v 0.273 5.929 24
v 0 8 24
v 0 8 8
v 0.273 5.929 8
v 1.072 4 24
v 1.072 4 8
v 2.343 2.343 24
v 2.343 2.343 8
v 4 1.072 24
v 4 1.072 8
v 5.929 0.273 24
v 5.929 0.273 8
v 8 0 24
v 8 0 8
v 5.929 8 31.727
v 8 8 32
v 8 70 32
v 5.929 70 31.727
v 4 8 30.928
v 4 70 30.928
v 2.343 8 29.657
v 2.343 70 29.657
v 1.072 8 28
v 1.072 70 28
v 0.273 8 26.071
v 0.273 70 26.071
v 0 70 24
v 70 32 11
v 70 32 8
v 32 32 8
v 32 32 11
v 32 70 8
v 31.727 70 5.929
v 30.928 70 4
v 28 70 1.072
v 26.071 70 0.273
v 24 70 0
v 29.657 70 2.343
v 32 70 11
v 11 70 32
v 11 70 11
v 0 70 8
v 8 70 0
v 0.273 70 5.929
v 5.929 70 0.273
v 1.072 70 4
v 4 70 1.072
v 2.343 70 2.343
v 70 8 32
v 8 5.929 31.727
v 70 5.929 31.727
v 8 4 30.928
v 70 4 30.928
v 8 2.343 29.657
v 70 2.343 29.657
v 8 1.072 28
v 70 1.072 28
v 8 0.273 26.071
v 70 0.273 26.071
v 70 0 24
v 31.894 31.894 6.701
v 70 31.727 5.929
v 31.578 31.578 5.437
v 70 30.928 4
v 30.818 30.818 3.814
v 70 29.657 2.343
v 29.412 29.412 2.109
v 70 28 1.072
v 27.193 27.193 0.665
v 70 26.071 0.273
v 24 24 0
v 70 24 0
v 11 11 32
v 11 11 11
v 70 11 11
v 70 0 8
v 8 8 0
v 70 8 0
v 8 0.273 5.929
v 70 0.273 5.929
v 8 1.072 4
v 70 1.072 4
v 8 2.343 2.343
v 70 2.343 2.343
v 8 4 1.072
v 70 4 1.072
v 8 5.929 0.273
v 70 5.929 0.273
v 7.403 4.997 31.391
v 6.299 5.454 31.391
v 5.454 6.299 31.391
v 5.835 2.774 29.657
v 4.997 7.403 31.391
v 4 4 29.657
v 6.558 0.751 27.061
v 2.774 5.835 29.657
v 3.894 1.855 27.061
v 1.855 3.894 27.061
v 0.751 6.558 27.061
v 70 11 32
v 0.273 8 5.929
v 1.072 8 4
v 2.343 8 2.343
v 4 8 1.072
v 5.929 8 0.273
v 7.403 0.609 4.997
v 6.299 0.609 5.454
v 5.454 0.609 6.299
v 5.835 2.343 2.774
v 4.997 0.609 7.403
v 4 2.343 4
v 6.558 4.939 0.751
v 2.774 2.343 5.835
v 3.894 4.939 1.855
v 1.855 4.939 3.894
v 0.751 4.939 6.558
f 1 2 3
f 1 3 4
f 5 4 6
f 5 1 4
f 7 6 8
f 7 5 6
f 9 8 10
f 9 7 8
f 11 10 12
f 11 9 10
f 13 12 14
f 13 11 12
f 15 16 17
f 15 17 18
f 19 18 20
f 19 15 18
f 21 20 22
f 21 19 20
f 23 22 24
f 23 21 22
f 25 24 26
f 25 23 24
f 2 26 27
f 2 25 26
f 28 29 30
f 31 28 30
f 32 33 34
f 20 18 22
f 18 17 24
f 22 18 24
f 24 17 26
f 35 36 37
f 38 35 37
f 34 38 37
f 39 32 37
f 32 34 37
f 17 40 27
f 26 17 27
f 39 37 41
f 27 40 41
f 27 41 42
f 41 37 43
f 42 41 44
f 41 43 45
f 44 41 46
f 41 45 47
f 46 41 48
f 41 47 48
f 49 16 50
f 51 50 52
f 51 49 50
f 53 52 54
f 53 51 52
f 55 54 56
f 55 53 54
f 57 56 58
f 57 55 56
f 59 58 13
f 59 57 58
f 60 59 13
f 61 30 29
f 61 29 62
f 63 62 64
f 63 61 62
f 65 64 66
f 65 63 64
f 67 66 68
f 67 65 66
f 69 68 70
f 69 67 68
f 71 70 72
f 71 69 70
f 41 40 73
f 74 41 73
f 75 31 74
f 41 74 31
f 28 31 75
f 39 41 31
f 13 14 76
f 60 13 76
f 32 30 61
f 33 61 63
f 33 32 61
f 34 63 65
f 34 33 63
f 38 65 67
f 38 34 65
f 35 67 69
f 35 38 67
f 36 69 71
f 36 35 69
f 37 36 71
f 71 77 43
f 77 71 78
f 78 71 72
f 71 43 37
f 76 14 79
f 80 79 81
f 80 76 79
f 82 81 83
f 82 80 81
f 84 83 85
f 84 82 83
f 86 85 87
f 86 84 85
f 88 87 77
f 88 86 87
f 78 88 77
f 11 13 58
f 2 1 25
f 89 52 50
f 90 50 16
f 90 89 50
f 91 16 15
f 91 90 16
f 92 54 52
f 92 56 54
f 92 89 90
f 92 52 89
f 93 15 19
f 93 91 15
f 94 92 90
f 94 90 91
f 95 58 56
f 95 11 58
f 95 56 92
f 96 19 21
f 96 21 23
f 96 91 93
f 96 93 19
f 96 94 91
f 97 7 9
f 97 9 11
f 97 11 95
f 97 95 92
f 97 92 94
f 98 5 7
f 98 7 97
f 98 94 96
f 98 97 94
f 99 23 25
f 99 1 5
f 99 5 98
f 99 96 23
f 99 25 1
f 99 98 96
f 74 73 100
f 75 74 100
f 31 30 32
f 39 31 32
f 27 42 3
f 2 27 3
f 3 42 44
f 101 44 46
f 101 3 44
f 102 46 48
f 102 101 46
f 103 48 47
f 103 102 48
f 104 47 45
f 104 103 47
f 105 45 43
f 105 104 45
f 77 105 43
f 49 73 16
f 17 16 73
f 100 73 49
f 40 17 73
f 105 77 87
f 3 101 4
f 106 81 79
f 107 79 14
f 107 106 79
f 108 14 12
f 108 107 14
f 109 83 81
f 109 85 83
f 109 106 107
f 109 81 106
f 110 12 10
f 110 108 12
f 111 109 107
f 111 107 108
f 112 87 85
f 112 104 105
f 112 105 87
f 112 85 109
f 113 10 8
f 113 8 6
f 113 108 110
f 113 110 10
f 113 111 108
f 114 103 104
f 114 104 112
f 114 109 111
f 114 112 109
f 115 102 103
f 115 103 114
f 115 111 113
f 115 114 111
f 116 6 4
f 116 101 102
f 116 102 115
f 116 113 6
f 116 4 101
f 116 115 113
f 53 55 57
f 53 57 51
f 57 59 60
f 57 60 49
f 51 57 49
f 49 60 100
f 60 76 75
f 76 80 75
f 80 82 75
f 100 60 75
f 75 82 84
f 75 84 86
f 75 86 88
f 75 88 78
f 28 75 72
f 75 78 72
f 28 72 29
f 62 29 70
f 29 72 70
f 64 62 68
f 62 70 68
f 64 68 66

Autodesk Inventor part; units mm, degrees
ref_plane "YZ Plane" through (0, 0, 0) normal (1, 0, 0) x (0, 1, 0)
ref_plane "XZ Plane" through (0, 0, 0) normal (0, 1, 0) x (-1, 0, 0)
ref_plane "XY Plane" through (0, 0, 0) normal (0, 0, 1) x (1, 0, 0)
sketch "スケッチ1" plane through (0, 0, 0) normal (0, 0, 1) x (1, 0, 0)
  line L0 (0, 0) -> (70, 0)
  line L1 (70, 0) -> (70, 32)
  line L2 (70, 32) -> (32, 32)
  line L3 (32, 32) -> (32, 70)
  line L4 (32, 70) -> (0, 70)
  line L5 (0, 70) -> (0, 0)
  dimension "d0" = 70
  dimension "d1" = 70
  dimension "d3" = 32
  dimension "d4" = 32
extrude "押し出し1" add sketch "スケッチ1" along normal blind 32
sketch "スケッチ2" plane through (0, 0, 32) normal (0, 0, 1) x (1, 0, 0)
  line L0 (11, 11) -> (70, 11)
  line L1 (70, 11) -> (70, 70)
  line L2 (70, 70) -> (11, 70)
  line L3 (11, 70) -> (11, 11)
  line L4 (32, 70) -> (0, 70) projected
  line L5 (70, 0) -> (70, 32) projected
  line L6 (32, 32) -> (32, 70) projected
  line L7 (70, 32) -> (32, 32) projected
  point P0 (0, 0)
  dimension "d11" = 21
  dimension "d12" = 21
extrude "押し出し2" cut sketch "スケッチ2" against normal blind 21
fillet "フィレット1" radius 8 7 edges at (32, 51, 0) (51, 32, 0) (0, 35, 0) (35, 0, 0) (0, 0, 16) (0, 35, 32) (35, 0, 32)
properties part number "クッション"
